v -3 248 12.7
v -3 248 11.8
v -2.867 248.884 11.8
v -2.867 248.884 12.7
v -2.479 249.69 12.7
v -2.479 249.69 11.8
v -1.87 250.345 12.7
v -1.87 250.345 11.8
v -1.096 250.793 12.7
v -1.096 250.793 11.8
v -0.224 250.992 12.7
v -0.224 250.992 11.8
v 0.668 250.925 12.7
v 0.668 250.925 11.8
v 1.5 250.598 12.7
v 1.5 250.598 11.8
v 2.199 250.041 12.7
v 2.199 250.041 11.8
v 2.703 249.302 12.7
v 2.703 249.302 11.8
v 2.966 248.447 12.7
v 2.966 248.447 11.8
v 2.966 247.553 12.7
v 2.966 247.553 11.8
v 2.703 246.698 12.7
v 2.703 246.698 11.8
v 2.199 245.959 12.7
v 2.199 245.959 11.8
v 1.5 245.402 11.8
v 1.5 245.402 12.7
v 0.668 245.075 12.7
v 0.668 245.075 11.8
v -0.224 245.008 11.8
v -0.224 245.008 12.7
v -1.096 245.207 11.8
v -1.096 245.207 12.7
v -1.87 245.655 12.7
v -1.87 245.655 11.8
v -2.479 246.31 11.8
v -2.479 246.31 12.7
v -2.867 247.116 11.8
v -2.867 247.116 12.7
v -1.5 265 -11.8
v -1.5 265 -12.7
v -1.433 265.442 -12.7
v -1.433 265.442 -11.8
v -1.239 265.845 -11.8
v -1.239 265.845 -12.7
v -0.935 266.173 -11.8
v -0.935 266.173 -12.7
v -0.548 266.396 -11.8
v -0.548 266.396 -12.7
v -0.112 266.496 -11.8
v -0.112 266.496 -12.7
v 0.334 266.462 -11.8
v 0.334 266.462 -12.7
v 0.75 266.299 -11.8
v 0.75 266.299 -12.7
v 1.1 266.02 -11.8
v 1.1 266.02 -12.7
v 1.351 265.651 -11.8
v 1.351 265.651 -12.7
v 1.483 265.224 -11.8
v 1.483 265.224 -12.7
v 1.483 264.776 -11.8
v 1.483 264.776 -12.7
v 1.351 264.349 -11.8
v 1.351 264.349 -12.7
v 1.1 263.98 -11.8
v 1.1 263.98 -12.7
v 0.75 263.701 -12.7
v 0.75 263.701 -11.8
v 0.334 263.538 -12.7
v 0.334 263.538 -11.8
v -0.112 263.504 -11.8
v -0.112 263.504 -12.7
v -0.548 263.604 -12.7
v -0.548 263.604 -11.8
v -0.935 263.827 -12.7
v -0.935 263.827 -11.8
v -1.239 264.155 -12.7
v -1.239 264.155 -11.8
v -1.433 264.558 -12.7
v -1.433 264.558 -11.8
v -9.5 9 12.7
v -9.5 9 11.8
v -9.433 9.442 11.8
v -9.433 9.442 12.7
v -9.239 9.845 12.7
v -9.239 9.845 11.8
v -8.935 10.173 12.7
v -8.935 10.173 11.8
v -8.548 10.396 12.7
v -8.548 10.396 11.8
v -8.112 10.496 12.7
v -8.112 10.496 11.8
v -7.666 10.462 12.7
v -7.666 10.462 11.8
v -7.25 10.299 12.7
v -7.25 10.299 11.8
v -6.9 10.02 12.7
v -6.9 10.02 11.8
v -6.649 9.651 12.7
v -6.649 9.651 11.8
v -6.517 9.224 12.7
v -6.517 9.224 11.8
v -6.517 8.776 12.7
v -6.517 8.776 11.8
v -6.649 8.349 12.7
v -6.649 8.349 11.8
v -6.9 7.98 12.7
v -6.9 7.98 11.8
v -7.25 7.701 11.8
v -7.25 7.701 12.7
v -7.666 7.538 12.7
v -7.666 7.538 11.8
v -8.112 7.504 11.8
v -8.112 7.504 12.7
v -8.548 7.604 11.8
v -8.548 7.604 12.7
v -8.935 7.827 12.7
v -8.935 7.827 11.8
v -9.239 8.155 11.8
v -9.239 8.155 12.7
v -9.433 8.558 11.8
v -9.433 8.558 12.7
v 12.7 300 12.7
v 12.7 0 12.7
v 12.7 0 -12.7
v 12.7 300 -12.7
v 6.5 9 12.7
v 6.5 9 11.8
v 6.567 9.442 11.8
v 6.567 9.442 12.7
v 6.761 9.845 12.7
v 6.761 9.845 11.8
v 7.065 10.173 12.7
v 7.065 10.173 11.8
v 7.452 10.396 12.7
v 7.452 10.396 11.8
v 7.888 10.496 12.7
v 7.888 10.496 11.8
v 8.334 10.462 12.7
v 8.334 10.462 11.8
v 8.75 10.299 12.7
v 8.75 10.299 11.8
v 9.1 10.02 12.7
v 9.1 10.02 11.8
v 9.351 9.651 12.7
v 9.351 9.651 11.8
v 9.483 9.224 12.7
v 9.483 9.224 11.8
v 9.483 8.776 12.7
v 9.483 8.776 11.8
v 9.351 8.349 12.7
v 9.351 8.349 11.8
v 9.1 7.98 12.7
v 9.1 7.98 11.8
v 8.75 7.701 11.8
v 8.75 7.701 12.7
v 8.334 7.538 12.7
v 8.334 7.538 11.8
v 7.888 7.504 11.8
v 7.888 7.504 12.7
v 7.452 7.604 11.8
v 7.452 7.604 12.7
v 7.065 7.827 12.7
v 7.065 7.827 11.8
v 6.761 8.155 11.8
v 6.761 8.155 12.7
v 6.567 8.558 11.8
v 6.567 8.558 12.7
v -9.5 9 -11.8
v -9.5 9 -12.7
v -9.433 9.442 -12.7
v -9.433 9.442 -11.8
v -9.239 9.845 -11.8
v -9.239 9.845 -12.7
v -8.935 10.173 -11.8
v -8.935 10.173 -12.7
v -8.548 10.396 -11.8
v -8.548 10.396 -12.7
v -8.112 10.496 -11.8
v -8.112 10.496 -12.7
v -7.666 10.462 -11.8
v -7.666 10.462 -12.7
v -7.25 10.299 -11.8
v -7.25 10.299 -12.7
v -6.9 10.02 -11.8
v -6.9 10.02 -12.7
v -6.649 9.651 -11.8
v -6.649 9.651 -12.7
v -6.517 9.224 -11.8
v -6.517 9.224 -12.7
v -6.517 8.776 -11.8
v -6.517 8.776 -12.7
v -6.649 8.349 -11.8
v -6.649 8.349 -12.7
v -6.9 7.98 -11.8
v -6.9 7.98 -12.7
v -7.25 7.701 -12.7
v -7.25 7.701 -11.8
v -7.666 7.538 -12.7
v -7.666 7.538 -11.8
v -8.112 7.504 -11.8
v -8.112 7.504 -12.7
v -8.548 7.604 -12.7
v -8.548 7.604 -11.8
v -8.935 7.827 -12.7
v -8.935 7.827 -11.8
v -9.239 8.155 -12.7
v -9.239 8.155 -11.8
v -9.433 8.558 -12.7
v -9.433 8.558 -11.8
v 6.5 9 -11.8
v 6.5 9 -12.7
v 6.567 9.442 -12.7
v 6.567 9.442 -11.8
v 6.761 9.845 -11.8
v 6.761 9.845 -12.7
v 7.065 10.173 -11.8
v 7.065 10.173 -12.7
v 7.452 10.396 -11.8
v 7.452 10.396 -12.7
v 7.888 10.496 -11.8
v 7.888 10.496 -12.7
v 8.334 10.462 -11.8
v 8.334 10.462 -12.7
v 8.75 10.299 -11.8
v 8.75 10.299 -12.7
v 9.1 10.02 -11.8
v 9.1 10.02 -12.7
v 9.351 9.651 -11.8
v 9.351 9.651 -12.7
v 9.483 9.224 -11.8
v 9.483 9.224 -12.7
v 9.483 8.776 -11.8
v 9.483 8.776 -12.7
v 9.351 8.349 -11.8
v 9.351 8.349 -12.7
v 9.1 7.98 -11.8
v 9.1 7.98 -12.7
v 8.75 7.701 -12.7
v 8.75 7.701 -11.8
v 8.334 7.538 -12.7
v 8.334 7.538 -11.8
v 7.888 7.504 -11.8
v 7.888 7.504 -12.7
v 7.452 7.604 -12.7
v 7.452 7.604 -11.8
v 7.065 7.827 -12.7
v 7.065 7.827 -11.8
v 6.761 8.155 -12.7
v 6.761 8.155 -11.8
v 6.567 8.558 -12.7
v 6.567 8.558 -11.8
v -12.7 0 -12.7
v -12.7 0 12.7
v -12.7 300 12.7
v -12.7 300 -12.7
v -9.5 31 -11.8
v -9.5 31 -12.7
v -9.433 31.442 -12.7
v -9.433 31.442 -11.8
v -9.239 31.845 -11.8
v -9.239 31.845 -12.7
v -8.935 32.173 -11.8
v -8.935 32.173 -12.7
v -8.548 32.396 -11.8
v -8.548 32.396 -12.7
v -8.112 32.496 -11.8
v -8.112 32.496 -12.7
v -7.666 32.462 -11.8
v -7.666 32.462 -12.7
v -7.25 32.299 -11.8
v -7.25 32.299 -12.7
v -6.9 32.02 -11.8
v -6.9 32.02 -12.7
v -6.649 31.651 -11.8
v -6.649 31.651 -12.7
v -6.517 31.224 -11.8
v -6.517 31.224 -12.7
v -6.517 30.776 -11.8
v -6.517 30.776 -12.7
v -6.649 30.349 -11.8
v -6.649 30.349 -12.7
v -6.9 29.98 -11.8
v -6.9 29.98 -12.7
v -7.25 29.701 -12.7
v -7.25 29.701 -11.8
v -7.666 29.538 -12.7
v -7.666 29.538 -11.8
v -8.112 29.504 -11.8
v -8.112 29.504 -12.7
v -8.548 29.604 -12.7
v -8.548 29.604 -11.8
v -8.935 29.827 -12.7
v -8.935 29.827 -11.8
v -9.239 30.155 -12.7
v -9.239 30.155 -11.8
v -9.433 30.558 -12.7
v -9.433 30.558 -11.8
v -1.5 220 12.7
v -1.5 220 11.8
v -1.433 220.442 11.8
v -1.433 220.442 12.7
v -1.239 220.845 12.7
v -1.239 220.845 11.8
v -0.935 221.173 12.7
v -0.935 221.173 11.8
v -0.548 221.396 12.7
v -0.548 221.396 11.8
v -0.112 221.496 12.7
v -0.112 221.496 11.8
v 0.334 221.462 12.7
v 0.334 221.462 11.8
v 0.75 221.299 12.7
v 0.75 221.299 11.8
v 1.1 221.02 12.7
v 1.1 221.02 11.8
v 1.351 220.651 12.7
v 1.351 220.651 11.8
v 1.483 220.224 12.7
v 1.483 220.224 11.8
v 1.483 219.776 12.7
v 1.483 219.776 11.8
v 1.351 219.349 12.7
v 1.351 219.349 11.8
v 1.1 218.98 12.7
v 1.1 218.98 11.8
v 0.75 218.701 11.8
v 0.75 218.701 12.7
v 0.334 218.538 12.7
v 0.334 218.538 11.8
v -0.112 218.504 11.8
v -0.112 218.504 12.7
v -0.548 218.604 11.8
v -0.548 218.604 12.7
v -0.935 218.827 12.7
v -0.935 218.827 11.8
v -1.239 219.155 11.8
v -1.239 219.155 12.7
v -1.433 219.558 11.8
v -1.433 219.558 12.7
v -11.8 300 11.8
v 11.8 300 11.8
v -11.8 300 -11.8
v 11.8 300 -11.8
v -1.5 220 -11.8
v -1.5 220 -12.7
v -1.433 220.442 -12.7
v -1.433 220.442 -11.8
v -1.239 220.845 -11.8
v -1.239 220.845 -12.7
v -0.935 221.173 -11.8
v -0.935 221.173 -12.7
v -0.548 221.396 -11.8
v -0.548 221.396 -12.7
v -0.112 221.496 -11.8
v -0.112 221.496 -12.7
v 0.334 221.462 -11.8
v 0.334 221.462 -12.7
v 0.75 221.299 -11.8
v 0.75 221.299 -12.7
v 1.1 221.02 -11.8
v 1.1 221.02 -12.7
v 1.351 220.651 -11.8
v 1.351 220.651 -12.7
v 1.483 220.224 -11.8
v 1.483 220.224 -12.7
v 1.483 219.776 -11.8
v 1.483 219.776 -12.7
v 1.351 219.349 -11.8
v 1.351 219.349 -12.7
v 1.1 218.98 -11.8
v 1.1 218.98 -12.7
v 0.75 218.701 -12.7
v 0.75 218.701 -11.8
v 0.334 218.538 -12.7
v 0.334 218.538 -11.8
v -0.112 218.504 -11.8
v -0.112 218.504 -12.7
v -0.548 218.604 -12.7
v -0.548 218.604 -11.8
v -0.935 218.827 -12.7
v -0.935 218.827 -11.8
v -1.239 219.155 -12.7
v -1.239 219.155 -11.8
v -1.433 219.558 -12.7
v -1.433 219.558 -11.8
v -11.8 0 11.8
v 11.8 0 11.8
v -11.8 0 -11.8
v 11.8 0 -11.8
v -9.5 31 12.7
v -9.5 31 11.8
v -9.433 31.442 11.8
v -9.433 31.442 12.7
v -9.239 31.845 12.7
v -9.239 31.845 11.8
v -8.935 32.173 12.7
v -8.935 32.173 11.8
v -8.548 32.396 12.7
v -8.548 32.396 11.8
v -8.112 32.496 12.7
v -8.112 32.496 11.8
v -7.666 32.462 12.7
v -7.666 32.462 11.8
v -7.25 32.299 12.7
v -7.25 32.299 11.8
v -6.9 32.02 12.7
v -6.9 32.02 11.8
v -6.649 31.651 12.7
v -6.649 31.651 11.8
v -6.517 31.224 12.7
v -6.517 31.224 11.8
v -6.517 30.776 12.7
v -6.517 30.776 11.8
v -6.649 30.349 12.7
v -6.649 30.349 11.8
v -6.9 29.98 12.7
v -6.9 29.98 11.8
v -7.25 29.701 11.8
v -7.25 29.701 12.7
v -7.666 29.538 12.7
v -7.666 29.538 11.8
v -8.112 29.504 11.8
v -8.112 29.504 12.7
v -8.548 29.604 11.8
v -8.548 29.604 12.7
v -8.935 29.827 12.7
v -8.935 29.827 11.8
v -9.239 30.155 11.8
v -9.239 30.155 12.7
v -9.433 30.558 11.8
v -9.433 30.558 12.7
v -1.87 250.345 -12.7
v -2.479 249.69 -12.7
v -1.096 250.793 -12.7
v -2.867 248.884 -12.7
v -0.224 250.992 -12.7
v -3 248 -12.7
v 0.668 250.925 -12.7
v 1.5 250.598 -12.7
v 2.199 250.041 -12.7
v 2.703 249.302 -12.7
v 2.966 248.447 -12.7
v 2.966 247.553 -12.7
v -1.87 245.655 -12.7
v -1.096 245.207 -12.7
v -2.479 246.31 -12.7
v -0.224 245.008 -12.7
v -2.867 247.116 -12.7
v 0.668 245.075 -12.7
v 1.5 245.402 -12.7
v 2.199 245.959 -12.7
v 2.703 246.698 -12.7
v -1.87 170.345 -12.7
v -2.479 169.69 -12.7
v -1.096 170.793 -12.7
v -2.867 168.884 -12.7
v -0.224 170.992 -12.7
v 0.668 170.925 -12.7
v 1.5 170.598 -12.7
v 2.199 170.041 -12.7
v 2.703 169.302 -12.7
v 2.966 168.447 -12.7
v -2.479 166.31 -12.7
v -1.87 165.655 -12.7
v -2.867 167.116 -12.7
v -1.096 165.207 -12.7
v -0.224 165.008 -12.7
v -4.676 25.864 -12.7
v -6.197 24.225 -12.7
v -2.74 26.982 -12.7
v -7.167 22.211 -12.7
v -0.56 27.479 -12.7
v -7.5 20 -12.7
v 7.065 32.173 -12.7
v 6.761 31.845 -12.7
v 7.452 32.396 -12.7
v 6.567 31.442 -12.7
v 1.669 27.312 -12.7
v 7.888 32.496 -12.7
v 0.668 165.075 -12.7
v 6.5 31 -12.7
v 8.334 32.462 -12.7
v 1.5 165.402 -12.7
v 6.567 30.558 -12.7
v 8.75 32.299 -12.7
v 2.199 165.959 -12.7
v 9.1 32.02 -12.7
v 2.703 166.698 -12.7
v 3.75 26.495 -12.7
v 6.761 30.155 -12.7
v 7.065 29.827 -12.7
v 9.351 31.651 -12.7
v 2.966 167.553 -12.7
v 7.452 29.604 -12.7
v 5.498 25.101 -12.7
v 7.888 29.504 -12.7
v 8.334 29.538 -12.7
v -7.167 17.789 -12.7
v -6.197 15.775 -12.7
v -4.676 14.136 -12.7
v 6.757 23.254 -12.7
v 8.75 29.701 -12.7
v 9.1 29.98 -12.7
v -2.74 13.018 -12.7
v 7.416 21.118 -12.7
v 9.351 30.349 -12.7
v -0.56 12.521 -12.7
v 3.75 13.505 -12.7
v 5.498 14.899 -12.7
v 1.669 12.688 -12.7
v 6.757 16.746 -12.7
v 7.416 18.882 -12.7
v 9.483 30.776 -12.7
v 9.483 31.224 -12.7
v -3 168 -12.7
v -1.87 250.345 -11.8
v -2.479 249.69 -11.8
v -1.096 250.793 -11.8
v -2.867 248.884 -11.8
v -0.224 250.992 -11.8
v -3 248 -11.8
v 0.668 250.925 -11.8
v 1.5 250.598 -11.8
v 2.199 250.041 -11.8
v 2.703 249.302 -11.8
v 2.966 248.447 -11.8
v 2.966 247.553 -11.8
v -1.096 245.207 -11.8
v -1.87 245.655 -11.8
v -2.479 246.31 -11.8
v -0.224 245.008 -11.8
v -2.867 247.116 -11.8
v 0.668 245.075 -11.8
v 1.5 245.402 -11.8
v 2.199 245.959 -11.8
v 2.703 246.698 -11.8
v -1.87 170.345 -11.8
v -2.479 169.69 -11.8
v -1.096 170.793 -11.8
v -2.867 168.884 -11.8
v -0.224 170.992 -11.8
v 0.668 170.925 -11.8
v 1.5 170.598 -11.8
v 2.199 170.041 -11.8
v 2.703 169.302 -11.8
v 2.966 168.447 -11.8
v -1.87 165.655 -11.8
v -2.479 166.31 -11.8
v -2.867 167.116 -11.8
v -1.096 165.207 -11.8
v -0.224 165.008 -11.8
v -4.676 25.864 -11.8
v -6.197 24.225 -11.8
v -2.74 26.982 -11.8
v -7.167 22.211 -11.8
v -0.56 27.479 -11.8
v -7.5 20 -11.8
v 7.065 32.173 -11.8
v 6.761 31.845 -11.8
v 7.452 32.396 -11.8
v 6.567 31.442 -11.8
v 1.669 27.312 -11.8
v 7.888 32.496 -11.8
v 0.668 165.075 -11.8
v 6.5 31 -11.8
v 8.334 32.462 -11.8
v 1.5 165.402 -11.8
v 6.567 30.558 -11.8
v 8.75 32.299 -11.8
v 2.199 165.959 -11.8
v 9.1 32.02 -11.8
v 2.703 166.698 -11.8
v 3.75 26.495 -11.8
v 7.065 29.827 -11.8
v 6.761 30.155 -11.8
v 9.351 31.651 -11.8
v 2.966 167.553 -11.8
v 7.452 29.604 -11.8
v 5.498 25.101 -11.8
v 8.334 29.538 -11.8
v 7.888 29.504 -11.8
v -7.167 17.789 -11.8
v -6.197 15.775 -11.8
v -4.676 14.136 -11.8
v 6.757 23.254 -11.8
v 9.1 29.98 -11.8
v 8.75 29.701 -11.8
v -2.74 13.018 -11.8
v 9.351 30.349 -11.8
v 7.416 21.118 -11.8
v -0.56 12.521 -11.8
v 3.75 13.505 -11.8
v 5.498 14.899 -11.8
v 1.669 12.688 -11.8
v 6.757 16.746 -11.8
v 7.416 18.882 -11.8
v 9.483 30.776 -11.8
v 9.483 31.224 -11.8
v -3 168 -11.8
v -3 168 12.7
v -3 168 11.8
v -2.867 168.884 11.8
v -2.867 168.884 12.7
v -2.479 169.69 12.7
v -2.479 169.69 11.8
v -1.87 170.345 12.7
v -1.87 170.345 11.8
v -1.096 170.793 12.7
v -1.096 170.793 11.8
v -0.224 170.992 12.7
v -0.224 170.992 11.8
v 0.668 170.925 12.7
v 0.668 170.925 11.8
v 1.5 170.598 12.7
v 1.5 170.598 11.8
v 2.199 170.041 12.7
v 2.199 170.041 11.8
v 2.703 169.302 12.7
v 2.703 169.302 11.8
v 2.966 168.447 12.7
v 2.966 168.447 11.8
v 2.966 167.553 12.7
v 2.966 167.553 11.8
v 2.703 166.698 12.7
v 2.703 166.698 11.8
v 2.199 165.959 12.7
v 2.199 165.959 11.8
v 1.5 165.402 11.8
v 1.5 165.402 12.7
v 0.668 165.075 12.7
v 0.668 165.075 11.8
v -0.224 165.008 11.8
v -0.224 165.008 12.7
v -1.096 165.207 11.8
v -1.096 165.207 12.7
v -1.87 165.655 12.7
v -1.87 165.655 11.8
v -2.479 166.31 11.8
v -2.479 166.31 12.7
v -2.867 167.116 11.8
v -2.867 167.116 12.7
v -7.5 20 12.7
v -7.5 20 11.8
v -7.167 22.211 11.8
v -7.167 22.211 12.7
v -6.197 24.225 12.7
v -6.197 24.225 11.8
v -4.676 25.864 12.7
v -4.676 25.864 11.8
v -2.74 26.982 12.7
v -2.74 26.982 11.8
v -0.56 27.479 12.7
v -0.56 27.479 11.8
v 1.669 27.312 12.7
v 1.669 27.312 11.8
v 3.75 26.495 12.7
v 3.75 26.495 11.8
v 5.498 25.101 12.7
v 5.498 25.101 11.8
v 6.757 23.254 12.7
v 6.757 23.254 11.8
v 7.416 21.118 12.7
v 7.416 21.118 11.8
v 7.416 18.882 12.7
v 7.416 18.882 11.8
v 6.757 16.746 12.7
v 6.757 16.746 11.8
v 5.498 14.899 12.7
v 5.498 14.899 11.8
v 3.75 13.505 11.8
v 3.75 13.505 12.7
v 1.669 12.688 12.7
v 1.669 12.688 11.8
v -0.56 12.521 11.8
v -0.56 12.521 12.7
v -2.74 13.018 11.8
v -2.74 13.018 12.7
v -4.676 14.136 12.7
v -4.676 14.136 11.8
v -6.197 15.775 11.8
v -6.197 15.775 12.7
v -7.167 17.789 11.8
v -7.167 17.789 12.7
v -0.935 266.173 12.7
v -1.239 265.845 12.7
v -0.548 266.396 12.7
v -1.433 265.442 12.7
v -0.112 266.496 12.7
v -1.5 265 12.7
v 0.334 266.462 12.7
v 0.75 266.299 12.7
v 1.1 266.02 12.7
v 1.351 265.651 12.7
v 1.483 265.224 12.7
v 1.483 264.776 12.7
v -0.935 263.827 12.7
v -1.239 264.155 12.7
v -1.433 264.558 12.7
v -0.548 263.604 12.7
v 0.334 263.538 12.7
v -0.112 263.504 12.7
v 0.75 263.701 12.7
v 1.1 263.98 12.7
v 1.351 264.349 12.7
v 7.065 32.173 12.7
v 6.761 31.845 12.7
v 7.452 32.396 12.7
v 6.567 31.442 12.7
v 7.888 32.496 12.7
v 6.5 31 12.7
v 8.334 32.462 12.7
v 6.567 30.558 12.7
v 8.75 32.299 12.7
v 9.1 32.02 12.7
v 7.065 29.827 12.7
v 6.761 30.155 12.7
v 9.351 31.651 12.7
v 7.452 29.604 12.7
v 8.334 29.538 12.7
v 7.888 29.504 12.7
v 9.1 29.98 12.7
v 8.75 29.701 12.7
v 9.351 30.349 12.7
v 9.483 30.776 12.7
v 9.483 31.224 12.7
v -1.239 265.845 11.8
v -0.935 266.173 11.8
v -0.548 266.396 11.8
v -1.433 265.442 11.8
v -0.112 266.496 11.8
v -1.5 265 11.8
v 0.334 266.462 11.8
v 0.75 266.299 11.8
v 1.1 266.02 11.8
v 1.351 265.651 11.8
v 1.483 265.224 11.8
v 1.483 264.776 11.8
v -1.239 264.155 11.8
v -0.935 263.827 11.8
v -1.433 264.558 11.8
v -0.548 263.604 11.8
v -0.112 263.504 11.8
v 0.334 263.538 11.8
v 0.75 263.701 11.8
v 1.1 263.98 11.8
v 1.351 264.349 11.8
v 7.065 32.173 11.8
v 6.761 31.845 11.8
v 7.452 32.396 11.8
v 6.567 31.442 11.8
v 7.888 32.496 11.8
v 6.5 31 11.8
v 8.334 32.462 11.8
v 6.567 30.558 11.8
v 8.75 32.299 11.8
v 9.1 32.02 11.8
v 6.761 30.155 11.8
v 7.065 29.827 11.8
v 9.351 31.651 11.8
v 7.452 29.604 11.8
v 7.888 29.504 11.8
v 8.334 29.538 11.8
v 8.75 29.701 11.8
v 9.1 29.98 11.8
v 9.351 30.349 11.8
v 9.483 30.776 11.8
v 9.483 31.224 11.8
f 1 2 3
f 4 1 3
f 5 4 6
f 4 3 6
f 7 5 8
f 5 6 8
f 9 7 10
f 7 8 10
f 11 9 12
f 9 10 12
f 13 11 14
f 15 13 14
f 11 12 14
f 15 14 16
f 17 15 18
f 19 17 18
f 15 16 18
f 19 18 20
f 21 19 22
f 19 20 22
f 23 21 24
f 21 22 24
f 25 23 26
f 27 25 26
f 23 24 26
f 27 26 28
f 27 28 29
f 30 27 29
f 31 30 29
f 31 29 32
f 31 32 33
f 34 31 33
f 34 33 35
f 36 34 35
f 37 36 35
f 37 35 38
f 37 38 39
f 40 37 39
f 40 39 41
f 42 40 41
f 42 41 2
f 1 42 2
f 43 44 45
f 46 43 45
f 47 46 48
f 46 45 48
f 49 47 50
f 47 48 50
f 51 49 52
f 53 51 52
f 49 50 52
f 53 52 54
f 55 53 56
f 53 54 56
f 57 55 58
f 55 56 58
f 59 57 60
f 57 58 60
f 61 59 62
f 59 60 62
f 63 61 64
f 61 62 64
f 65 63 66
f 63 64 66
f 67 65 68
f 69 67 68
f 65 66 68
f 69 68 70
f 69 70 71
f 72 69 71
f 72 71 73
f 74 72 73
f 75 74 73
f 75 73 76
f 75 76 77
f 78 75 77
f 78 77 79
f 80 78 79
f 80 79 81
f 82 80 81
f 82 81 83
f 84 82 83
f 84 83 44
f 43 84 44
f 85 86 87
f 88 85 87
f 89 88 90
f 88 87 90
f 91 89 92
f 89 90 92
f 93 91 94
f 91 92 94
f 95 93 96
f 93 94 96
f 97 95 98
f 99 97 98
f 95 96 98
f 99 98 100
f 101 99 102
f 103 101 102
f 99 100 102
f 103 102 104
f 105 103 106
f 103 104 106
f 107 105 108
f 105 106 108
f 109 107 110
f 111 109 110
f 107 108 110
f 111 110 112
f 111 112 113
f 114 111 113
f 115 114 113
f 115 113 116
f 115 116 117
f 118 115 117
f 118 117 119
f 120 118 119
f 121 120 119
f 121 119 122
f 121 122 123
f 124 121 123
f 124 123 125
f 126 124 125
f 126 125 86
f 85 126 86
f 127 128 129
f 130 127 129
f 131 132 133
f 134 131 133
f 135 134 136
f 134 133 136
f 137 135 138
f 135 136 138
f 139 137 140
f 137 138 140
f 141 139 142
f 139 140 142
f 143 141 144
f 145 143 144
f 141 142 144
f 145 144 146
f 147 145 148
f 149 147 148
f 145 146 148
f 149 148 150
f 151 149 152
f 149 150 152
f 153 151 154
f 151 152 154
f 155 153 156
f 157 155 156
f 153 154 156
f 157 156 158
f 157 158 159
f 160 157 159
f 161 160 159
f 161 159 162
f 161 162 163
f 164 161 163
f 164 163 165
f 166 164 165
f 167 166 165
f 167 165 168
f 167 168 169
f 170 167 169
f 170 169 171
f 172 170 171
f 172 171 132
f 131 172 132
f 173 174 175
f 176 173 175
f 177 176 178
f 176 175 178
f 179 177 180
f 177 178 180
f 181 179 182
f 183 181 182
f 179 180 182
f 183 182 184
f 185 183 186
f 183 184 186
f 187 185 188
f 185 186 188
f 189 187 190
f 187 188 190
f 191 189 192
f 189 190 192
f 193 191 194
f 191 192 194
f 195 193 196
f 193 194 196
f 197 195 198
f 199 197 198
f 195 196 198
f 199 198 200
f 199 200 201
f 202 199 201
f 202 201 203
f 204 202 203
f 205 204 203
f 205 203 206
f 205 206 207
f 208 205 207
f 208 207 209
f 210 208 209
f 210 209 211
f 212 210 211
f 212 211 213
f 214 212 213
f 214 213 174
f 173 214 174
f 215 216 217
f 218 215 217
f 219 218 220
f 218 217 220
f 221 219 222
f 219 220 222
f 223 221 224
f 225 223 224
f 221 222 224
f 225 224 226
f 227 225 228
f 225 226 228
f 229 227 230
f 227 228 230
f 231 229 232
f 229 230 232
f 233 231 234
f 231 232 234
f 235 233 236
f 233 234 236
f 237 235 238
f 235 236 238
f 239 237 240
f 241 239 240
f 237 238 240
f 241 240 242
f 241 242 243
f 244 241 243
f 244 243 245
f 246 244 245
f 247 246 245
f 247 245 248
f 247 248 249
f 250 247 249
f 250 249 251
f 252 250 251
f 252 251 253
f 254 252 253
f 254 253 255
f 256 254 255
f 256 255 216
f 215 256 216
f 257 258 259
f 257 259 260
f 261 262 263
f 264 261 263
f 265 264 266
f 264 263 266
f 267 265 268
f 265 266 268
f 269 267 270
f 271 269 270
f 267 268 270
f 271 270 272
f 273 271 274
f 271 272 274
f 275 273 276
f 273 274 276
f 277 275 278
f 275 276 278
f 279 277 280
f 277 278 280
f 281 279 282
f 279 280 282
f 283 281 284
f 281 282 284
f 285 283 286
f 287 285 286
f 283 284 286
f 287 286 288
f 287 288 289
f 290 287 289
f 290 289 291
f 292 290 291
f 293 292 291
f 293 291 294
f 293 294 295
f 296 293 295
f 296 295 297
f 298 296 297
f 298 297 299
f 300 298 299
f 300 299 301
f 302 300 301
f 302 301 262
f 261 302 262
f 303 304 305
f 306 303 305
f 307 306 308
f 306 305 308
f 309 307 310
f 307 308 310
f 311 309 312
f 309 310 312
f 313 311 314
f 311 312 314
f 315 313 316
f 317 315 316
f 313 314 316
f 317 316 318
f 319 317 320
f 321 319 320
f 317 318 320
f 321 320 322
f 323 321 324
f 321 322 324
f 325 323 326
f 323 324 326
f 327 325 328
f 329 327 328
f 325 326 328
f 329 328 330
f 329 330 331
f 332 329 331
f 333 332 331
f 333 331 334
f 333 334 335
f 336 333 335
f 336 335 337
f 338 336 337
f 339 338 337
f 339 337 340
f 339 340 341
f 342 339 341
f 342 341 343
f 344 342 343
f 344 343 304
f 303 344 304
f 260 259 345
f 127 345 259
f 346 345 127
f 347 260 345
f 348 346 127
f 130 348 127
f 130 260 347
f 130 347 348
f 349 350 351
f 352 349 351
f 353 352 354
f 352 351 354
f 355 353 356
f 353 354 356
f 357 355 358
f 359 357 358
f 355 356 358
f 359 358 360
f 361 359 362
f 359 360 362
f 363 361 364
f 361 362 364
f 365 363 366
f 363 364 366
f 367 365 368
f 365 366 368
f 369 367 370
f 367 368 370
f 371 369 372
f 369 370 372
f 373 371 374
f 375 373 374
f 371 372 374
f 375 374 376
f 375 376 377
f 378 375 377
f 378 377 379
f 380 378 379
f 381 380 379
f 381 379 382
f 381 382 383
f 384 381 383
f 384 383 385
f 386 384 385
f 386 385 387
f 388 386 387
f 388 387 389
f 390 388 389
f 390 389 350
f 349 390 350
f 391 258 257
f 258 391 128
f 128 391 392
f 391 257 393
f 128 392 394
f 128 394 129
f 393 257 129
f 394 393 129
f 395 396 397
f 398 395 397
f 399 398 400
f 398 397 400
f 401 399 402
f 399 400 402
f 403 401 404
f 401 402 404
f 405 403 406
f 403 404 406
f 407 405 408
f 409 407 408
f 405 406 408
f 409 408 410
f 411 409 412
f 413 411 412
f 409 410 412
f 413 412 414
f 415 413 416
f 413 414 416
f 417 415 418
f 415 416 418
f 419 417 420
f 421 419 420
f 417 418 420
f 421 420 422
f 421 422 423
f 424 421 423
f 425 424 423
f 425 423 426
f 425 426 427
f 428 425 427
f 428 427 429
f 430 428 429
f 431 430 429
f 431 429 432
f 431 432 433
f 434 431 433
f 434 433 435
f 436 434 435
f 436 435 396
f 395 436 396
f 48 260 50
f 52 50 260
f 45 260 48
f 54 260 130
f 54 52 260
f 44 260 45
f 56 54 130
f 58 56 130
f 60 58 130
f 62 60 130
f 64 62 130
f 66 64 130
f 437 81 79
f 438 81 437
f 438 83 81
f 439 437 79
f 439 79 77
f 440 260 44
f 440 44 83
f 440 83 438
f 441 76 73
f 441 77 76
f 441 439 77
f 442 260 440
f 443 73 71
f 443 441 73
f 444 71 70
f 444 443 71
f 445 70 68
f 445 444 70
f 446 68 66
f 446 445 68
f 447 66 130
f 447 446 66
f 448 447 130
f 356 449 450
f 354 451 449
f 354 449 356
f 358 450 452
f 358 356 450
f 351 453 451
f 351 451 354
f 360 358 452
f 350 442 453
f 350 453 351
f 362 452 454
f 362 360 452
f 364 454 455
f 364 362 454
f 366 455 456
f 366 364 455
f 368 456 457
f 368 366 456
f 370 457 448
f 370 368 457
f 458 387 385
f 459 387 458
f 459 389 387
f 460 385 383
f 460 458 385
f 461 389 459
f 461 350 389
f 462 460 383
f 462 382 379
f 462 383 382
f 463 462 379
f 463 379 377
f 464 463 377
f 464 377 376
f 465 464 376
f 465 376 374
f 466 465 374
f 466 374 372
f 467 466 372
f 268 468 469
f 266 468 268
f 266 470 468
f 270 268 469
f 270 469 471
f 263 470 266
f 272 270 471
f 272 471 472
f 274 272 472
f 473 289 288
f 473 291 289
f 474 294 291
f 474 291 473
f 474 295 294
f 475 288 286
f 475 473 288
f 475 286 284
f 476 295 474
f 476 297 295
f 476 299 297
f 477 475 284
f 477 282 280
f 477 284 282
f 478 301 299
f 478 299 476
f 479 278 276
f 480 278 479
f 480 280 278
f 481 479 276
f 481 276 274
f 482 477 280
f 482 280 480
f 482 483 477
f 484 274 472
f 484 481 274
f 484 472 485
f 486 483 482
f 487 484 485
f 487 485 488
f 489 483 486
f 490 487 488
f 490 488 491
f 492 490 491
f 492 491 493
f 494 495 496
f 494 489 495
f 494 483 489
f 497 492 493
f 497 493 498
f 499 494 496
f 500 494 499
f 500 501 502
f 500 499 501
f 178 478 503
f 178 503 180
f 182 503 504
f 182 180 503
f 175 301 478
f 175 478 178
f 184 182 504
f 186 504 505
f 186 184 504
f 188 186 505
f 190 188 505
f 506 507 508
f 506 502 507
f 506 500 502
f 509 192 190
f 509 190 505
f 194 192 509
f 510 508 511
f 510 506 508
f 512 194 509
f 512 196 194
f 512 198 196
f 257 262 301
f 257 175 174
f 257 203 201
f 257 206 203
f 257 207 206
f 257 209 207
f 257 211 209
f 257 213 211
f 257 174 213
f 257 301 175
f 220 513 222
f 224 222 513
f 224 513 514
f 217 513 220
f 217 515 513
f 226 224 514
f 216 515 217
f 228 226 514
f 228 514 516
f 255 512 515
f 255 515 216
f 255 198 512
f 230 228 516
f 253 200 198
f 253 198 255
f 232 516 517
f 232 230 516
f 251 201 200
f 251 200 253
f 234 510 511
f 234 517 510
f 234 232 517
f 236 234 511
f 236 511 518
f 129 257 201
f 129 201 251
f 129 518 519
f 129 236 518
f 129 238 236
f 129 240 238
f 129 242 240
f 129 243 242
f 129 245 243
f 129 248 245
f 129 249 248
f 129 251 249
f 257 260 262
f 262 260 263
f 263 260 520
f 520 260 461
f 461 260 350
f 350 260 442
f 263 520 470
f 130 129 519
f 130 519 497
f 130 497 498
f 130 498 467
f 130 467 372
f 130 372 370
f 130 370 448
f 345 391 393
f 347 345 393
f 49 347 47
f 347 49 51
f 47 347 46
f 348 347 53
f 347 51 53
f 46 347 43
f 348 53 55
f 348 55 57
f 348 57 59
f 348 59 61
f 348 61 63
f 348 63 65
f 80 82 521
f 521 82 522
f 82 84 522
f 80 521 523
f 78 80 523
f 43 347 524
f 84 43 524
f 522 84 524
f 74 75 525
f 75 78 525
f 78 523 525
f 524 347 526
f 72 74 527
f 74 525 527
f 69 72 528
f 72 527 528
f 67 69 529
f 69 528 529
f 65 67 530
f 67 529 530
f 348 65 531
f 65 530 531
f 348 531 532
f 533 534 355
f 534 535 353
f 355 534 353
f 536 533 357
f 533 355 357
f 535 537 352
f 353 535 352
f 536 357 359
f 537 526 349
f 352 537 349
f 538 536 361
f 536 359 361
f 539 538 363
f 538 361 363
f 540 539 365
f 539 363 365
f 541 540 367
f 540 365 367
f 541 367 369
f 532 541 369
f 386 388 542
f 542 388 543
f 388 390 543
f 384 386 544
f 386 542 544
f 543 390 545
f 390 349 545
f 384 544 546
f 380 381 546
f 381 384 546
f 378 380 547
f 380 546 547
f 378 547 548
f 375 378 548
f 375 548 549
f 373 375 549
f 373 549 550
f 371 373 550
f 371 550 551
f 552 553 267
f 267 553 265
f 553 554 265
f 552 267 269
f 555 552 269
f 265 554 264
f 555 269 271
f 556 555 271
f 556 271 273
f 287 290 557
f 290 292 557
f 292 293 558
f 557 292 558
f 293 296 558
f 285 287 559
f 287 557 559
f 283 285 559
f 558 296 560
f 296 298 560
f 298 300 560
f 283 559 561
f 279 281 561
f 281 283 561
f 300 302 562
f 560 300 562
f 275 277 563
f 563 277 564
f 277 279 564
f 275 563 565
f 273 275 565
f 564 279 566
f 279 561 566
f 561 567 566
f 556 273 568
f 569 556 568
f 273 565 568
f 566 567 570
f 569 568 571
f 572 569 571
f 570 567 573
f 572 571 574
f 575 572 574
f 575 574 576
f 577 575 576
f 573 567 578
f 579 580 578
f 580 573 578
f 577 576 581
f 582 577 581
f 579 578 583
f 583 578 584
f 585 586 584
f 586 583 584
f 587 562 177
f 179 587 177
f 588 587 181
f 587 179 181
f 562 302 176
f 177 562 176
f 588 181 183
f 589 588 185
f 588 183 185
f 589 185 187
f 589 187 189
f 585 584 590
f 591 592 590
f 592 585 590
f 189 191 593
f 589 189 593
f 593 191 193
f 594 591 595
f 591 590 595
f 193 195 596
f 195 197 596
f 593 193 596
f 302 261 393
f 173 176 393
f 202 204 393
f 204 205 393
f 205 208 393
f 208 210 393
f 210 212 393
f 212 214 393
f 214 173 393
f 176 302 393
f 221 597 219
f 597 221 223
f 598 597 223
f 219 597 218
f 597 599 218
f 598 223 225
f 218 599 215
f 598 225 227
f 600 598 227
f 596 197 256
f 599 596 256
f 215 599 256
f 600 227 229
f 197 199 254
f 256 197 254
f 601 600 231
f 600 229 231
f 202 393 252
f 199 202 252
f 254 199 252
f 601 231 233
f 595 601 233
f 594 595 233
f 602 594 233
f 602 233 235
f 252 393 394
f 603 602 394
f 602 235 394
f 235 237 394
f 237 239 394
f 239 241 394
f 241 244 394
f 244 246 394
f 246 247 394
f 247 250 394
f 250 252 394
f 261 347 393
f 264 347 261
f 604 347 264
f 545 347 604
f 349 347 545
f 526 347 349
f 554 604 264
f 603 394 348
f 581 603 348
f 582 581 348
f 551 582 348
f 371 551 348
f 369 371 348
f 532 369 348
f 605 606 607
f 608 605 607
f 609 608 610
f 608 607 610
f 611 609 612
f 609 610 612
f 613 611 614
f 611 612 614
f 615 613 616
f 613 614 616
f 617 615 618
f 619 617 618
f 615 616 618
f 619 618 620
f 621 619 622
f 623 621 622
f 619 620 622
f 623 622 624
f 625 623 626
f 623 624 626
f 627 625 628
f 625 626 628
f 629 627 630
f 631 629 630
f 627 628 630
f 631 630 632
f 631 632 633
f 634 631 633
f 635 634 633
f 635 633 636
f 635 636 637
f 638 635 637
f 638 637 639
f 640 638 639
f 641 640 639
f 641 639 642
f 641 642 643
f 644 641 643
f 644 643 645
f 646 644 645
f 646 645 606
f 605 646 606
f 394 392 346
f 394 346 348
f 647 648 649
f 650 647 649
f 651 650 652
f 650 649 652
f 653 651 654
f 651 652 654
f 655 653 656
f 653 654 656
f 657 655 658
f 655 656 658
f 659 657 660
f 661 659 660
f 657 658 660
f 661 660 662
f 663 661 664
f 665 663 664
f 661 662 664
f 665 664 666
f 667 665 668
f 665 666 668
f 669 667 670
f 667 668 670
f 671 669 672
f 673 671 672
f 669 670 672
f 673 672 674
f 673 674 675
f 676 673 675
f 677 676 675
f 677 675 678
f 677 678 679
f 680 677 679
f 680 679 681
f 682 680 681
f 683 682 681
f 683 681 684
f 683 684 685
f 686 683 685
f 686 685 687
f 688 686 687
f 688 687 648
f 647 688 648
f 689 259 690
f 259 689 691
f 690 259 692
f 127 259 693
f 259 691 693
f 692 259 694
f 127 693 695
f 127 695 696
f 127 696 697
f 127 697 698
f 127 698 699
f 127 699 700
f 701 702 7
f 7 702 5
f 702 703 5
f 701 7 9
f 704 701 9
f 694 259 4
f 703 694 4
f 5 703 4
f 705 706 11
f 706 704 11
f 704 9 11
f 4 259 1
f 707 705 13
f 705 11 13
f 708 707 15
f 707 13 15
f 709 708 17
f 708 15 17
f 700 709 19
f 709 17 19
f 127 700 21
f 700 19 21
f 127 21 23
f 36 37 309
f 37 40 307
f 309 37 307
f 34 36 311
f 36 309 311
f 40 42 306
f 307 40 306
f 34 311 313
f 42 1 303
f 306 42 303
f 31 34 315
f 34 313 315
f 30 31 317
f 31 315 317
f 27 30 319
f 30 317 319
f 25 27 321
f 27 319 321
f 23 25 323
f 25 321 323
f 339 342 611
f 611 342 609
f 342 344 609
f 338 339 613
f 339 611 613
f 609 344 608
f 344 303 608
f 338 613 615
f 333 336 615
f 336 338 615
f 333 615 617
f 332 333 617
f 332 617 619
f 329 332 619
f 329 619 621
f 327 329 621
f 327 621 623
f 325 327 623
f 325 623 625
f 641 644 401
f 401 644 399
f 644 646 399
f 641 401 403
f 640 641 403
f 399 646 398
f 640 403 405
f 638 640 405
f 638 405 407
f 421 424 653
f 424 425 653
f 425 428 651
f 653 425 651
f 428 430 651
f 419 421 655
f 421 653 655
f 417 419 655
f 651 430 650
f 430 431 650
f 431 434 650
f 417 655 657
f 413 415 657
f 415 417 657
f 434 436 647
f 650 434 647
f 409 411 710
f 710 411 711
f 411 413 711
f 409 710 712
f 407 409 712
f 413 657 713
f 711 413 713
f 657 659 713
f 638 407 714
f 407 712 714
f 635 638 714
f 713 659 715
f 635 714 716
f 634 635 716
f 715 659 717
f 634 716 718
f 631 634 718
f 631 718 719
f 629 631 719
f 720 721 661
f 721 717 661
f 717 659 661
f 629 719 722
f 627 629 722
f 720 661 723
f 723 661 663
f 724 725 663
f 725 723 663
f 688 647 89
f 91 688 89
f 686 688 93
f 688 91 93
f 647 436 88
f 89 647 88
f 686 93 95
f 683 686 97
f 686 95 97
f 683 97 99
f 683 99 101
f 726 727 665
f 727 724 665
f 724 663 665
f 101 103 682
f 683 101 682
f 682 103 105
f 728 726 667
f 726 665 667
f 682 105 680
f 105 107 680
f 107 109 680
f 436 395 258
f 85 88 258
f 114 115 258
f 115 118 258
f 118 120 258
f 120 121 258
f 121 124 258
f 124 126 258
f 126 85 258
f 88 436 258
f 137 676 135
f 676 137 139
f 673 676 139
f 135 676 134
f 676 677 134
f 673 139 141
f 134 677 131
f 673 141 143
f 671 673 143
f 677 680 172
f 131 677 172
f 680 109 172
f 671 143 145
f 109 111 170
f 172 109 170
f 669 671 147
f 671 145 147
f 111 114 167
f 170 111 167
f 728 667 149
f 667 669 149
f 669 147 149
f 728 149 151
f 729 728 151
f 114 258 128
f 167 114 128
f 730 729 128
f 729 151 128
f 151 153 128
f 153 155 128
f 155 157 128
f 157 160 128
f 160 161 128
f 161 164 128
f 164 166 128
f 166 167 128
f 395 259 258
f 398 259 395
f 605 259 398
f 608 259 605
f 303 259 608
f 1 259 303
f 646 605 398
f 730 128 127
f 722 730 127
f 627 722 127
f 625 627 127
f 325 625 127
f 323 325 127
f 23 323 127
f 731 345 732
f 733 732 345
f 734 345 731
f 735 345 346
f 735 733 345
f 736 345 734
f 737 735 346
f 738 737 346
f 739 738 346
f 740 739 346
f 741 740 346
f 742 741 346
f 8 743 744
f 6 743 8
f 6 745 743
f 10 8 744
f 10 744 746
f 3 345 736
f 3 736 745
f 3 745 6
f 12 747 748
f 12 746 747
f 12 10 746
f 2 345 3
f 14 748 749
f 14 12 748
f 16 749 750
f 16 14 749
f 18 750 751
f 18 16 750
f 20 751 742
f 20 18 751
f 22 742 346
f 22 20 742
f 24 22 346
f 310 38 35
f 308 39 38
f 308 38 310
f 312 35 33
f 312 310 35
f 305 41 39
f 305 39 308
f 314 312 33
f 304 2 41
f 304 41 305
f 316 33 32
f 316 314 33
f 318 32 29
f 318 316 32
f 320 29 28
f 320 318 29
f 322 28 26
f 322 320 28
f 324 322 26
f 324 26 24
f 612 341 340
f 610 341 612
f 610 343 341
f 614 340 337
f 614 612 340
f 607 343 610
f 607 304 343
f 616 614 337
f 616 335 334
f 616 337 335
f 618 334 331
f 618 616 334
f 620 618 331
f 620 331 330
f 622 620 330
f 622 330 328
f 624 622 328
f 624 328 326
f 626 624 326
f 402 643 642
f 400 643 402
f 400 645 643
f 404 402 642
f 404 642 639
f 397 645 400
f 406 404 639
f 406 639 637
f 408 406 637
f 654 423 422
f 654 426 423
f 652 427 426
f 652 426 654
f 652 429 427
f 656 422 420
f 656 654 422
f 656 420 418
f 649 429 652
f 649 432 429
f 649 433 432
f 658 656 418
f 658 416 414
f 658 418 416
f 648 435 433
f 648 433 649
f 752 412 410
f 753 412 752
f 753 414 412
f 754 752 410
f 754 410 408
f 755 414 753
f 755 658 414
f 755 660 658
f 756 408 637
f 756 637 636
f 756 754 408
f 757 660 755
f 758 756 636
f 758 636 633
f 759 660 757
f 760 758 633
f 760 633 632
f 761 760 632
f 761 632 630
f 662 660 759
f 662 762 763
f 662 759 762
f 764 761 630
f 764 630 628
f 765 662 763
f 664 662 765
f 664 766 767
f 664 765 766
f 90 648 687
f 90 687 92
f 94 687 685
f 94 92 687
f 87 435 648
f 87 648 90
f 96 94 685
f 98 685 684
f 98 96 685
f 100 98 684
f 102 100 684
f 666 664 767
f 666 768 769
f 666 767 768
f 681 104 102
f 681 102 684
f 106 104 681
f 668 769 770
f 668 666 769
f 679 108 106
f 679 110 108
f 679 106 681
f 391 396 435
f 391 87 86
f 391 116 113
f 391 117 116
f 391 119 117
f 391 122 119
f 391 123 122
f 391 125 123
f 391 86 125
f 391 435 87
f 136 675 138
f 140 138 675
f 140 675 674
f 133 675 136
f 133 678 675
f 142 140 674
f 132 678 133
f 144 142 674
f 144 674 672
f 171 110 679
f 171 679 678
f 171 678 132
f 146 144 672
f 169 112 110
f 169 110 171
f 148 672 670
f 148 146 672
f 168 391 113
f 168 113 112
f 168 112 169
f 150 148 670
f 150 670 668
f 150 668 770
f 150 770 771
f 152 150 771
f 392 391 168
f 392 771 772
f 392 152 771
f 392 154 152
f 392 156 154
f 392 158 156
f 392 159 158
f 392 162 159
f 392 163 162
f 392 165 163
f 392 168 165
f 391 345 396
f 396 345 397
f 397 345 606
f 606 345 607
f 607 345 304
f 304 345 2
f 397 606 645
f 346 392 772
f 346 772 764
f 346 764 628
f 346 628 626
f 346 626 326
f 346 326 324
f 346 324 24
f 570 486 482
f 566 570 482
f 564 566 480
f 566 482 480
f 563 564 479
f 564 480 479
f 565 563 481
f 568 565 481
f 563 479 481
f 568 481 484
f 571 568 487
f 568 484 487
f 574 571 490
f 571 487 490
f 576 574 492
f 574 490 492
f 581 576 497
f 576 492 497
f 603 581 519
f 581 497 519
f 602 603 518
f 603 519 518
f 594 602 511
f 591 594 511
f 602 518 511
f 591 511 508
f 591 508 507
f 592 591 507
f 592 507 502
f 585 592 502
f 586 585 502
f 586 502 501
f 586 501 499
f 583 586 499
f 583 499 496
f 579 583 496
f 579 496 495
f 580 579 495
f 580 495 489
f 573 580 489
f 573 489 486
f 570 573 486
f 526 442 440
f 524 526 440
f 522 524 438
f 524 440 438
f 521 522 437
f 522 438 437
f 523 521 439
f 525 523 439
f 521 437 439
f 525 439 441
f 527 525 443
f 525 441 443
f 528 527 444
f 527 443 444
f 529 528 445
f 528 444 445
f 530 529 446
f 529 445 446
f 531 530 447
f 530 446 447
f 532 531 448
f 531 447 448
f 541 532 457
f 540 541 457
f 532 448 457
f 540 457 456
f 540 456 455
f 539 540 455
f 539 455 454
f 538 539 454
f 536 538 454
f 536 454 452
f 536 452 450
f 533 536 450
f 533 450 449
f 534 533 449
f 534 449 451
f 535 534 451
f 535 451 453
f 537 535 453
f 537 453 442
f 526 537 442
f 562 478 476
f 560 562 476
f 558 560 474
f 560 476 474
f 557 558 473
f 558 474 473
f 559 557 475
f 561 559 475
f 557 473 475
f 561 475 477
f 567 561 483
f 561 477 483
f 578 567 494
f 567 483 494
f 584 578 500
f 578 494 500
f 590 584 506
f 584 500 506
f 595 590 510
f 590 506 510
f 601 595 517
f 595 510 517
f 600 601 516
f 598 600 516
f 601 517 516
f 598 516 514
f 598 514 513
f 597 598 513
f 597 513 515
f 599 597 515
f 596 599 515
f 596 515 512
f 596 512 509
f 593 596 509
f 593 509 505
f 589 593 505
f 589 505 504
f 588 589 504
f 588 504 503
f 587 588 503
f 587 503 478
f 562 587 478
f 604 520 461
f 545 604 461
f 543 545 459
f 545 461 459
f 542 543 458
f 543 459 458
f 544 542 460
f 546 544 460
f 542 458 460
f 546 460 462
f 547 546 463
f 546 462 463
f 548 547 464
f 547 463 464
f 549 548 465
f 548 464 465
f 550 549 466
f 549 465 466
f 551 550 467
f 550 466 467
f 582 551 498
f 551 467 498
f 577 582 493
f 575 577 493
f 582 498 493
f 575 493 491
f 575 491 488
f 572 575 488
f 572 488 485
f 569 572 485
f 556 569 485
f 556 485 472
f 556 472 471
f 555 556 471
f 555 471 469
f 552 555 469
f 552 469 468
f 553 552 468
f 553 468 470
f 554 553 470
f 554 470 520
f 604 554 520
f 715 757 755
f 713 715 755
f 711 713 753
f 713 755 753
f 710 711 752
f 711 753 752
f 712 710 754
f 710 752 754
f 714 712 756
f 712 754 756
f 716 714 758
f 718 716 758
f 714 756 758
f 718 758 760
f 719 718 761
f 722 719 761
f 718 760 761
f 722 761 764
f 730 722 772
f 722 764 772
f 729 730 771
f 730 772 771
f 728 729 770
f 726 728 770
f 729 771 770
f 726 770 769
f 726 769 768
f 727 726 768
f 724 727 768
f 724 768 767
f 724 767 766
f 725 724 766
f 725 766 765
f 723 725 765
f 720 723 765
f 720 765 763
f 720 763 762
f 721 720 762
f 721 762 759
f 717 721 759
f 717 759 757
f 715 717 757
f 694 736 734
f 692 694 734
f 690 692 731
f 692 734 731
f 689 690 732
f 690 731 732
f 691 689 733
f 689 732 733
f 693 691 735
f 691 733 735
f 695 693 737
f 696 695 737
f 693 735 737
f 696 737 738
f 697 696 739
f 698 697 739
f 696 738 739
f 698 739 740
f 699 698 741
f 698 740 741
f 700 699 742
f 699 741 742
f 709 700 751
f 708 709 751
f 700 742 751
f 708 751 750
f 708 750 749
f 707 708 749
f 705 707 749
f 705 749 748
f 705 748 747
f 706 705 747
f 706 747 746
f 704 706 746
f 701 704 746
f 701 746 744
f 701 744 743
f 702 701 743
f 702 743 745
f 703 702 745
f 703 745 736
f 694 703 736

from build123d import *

# Parameters (mm, degrees)
SKETCH1_W           = 25.4
SKETCH1_H           = 25.4
SKETCH1_W_2         = 23.6
SKETCH1_H_2         = 23.6
BOSS_EXTRUDE1_DEPTH = 300
SKETCH2_R           = 7.5
CUT_EXTRUDE1_DEPTH  = 25.4
SKETCH3_R           = 3
CUT_EXTRUDE2_DEPTH  = 25.4
SKETCH4_R           = 1.5
CUT_EXTRUDE3_DEPTH  = 25.4
SKETCH5_R           = 1.5
CUT_EXTRUDE4_DEPTH  = 25.4


with BuildPart() as part:
    # Sketch1 → Boss-Extrude1 (new body)
    with BuildSketch(Plane(origin=(0, 0, 0), x_dir=(1, 0, 0), z_dir=(0, 1, 0))):
        Rectangle(SKETCH1_W, SKETCH1_H)
        Rectangle(SKETCH1_W_2, SKETCH1_H_2, mode=Mode.SUBTRACT)
    extrude(amount=BOSS_EXTRUDE1_DEPTH)

    # Sketch2 → Cut-Extrude1 (cut)
    with BuildSketch(Plane(origin=(0, 0, -12.7), x_dir=(-1, 0, 0), z_dir=(0, 0, -1))):
        with Locations((0, 20)):
            Circle(SKETCH2_R)
    extrude(amount=-CUT_EXTRUDE1_DEPTH, mode=Mode.SUBTRACT)

    # Sketch3 → Cut-Extrude2 (cut)
    with BuildSketch(Plane(origin=(0, 0, -12.7), x_dir=(-1, 0, 0), z_dir=(0, 0, -1))):
        with Locations((0, 168)):
            Circle(SKETCH3_R)
        with Locations((0, 248)):
            Circle(SKETCH3_R)
    extrude(amount=-CUT_EXTRUDE2_DEPTH, mode=Mode.SUBTRACT)

    # Sketch4 → Cut-Extrude3 (cut)
    with BuildSketch(Plane(origin=(0, 0, -12.7), x_dir=(-1, 0, 0), z_dir=(0, 0, -1))):
        with Locations((8, 9)):
            Circle(SKETCH4_R)
        with Locations((8, 31)):
            Circle(SKETCH4_R)
        with Locations((-8, 9)):
            Circle(SKETCH4_R)
        with Locations((-8, 31)):
            Circle(SKETCH4_R)
    extrude(amount=-CUT_EXTRUDE3_DEPTH, mode=Mode.SUBTRACT)

    # Sketch5 → Cut-Extrude4 (cut)
    with BuildSketch(Plane(origin=(0, 0, -12.7), x_dir=(-1, 0, 0), z_dir=(0, 0, -1))):
        with Locations((0, 220)):
            Circle(SKETCH5_R)
        with Locations((0, 265)):
            Circle(SKETCH5_R)
    extrude(amount=-CUT_EXTRUDE4_DEPTH, mode=Mode.SUBTRACT)


solid = part.part
